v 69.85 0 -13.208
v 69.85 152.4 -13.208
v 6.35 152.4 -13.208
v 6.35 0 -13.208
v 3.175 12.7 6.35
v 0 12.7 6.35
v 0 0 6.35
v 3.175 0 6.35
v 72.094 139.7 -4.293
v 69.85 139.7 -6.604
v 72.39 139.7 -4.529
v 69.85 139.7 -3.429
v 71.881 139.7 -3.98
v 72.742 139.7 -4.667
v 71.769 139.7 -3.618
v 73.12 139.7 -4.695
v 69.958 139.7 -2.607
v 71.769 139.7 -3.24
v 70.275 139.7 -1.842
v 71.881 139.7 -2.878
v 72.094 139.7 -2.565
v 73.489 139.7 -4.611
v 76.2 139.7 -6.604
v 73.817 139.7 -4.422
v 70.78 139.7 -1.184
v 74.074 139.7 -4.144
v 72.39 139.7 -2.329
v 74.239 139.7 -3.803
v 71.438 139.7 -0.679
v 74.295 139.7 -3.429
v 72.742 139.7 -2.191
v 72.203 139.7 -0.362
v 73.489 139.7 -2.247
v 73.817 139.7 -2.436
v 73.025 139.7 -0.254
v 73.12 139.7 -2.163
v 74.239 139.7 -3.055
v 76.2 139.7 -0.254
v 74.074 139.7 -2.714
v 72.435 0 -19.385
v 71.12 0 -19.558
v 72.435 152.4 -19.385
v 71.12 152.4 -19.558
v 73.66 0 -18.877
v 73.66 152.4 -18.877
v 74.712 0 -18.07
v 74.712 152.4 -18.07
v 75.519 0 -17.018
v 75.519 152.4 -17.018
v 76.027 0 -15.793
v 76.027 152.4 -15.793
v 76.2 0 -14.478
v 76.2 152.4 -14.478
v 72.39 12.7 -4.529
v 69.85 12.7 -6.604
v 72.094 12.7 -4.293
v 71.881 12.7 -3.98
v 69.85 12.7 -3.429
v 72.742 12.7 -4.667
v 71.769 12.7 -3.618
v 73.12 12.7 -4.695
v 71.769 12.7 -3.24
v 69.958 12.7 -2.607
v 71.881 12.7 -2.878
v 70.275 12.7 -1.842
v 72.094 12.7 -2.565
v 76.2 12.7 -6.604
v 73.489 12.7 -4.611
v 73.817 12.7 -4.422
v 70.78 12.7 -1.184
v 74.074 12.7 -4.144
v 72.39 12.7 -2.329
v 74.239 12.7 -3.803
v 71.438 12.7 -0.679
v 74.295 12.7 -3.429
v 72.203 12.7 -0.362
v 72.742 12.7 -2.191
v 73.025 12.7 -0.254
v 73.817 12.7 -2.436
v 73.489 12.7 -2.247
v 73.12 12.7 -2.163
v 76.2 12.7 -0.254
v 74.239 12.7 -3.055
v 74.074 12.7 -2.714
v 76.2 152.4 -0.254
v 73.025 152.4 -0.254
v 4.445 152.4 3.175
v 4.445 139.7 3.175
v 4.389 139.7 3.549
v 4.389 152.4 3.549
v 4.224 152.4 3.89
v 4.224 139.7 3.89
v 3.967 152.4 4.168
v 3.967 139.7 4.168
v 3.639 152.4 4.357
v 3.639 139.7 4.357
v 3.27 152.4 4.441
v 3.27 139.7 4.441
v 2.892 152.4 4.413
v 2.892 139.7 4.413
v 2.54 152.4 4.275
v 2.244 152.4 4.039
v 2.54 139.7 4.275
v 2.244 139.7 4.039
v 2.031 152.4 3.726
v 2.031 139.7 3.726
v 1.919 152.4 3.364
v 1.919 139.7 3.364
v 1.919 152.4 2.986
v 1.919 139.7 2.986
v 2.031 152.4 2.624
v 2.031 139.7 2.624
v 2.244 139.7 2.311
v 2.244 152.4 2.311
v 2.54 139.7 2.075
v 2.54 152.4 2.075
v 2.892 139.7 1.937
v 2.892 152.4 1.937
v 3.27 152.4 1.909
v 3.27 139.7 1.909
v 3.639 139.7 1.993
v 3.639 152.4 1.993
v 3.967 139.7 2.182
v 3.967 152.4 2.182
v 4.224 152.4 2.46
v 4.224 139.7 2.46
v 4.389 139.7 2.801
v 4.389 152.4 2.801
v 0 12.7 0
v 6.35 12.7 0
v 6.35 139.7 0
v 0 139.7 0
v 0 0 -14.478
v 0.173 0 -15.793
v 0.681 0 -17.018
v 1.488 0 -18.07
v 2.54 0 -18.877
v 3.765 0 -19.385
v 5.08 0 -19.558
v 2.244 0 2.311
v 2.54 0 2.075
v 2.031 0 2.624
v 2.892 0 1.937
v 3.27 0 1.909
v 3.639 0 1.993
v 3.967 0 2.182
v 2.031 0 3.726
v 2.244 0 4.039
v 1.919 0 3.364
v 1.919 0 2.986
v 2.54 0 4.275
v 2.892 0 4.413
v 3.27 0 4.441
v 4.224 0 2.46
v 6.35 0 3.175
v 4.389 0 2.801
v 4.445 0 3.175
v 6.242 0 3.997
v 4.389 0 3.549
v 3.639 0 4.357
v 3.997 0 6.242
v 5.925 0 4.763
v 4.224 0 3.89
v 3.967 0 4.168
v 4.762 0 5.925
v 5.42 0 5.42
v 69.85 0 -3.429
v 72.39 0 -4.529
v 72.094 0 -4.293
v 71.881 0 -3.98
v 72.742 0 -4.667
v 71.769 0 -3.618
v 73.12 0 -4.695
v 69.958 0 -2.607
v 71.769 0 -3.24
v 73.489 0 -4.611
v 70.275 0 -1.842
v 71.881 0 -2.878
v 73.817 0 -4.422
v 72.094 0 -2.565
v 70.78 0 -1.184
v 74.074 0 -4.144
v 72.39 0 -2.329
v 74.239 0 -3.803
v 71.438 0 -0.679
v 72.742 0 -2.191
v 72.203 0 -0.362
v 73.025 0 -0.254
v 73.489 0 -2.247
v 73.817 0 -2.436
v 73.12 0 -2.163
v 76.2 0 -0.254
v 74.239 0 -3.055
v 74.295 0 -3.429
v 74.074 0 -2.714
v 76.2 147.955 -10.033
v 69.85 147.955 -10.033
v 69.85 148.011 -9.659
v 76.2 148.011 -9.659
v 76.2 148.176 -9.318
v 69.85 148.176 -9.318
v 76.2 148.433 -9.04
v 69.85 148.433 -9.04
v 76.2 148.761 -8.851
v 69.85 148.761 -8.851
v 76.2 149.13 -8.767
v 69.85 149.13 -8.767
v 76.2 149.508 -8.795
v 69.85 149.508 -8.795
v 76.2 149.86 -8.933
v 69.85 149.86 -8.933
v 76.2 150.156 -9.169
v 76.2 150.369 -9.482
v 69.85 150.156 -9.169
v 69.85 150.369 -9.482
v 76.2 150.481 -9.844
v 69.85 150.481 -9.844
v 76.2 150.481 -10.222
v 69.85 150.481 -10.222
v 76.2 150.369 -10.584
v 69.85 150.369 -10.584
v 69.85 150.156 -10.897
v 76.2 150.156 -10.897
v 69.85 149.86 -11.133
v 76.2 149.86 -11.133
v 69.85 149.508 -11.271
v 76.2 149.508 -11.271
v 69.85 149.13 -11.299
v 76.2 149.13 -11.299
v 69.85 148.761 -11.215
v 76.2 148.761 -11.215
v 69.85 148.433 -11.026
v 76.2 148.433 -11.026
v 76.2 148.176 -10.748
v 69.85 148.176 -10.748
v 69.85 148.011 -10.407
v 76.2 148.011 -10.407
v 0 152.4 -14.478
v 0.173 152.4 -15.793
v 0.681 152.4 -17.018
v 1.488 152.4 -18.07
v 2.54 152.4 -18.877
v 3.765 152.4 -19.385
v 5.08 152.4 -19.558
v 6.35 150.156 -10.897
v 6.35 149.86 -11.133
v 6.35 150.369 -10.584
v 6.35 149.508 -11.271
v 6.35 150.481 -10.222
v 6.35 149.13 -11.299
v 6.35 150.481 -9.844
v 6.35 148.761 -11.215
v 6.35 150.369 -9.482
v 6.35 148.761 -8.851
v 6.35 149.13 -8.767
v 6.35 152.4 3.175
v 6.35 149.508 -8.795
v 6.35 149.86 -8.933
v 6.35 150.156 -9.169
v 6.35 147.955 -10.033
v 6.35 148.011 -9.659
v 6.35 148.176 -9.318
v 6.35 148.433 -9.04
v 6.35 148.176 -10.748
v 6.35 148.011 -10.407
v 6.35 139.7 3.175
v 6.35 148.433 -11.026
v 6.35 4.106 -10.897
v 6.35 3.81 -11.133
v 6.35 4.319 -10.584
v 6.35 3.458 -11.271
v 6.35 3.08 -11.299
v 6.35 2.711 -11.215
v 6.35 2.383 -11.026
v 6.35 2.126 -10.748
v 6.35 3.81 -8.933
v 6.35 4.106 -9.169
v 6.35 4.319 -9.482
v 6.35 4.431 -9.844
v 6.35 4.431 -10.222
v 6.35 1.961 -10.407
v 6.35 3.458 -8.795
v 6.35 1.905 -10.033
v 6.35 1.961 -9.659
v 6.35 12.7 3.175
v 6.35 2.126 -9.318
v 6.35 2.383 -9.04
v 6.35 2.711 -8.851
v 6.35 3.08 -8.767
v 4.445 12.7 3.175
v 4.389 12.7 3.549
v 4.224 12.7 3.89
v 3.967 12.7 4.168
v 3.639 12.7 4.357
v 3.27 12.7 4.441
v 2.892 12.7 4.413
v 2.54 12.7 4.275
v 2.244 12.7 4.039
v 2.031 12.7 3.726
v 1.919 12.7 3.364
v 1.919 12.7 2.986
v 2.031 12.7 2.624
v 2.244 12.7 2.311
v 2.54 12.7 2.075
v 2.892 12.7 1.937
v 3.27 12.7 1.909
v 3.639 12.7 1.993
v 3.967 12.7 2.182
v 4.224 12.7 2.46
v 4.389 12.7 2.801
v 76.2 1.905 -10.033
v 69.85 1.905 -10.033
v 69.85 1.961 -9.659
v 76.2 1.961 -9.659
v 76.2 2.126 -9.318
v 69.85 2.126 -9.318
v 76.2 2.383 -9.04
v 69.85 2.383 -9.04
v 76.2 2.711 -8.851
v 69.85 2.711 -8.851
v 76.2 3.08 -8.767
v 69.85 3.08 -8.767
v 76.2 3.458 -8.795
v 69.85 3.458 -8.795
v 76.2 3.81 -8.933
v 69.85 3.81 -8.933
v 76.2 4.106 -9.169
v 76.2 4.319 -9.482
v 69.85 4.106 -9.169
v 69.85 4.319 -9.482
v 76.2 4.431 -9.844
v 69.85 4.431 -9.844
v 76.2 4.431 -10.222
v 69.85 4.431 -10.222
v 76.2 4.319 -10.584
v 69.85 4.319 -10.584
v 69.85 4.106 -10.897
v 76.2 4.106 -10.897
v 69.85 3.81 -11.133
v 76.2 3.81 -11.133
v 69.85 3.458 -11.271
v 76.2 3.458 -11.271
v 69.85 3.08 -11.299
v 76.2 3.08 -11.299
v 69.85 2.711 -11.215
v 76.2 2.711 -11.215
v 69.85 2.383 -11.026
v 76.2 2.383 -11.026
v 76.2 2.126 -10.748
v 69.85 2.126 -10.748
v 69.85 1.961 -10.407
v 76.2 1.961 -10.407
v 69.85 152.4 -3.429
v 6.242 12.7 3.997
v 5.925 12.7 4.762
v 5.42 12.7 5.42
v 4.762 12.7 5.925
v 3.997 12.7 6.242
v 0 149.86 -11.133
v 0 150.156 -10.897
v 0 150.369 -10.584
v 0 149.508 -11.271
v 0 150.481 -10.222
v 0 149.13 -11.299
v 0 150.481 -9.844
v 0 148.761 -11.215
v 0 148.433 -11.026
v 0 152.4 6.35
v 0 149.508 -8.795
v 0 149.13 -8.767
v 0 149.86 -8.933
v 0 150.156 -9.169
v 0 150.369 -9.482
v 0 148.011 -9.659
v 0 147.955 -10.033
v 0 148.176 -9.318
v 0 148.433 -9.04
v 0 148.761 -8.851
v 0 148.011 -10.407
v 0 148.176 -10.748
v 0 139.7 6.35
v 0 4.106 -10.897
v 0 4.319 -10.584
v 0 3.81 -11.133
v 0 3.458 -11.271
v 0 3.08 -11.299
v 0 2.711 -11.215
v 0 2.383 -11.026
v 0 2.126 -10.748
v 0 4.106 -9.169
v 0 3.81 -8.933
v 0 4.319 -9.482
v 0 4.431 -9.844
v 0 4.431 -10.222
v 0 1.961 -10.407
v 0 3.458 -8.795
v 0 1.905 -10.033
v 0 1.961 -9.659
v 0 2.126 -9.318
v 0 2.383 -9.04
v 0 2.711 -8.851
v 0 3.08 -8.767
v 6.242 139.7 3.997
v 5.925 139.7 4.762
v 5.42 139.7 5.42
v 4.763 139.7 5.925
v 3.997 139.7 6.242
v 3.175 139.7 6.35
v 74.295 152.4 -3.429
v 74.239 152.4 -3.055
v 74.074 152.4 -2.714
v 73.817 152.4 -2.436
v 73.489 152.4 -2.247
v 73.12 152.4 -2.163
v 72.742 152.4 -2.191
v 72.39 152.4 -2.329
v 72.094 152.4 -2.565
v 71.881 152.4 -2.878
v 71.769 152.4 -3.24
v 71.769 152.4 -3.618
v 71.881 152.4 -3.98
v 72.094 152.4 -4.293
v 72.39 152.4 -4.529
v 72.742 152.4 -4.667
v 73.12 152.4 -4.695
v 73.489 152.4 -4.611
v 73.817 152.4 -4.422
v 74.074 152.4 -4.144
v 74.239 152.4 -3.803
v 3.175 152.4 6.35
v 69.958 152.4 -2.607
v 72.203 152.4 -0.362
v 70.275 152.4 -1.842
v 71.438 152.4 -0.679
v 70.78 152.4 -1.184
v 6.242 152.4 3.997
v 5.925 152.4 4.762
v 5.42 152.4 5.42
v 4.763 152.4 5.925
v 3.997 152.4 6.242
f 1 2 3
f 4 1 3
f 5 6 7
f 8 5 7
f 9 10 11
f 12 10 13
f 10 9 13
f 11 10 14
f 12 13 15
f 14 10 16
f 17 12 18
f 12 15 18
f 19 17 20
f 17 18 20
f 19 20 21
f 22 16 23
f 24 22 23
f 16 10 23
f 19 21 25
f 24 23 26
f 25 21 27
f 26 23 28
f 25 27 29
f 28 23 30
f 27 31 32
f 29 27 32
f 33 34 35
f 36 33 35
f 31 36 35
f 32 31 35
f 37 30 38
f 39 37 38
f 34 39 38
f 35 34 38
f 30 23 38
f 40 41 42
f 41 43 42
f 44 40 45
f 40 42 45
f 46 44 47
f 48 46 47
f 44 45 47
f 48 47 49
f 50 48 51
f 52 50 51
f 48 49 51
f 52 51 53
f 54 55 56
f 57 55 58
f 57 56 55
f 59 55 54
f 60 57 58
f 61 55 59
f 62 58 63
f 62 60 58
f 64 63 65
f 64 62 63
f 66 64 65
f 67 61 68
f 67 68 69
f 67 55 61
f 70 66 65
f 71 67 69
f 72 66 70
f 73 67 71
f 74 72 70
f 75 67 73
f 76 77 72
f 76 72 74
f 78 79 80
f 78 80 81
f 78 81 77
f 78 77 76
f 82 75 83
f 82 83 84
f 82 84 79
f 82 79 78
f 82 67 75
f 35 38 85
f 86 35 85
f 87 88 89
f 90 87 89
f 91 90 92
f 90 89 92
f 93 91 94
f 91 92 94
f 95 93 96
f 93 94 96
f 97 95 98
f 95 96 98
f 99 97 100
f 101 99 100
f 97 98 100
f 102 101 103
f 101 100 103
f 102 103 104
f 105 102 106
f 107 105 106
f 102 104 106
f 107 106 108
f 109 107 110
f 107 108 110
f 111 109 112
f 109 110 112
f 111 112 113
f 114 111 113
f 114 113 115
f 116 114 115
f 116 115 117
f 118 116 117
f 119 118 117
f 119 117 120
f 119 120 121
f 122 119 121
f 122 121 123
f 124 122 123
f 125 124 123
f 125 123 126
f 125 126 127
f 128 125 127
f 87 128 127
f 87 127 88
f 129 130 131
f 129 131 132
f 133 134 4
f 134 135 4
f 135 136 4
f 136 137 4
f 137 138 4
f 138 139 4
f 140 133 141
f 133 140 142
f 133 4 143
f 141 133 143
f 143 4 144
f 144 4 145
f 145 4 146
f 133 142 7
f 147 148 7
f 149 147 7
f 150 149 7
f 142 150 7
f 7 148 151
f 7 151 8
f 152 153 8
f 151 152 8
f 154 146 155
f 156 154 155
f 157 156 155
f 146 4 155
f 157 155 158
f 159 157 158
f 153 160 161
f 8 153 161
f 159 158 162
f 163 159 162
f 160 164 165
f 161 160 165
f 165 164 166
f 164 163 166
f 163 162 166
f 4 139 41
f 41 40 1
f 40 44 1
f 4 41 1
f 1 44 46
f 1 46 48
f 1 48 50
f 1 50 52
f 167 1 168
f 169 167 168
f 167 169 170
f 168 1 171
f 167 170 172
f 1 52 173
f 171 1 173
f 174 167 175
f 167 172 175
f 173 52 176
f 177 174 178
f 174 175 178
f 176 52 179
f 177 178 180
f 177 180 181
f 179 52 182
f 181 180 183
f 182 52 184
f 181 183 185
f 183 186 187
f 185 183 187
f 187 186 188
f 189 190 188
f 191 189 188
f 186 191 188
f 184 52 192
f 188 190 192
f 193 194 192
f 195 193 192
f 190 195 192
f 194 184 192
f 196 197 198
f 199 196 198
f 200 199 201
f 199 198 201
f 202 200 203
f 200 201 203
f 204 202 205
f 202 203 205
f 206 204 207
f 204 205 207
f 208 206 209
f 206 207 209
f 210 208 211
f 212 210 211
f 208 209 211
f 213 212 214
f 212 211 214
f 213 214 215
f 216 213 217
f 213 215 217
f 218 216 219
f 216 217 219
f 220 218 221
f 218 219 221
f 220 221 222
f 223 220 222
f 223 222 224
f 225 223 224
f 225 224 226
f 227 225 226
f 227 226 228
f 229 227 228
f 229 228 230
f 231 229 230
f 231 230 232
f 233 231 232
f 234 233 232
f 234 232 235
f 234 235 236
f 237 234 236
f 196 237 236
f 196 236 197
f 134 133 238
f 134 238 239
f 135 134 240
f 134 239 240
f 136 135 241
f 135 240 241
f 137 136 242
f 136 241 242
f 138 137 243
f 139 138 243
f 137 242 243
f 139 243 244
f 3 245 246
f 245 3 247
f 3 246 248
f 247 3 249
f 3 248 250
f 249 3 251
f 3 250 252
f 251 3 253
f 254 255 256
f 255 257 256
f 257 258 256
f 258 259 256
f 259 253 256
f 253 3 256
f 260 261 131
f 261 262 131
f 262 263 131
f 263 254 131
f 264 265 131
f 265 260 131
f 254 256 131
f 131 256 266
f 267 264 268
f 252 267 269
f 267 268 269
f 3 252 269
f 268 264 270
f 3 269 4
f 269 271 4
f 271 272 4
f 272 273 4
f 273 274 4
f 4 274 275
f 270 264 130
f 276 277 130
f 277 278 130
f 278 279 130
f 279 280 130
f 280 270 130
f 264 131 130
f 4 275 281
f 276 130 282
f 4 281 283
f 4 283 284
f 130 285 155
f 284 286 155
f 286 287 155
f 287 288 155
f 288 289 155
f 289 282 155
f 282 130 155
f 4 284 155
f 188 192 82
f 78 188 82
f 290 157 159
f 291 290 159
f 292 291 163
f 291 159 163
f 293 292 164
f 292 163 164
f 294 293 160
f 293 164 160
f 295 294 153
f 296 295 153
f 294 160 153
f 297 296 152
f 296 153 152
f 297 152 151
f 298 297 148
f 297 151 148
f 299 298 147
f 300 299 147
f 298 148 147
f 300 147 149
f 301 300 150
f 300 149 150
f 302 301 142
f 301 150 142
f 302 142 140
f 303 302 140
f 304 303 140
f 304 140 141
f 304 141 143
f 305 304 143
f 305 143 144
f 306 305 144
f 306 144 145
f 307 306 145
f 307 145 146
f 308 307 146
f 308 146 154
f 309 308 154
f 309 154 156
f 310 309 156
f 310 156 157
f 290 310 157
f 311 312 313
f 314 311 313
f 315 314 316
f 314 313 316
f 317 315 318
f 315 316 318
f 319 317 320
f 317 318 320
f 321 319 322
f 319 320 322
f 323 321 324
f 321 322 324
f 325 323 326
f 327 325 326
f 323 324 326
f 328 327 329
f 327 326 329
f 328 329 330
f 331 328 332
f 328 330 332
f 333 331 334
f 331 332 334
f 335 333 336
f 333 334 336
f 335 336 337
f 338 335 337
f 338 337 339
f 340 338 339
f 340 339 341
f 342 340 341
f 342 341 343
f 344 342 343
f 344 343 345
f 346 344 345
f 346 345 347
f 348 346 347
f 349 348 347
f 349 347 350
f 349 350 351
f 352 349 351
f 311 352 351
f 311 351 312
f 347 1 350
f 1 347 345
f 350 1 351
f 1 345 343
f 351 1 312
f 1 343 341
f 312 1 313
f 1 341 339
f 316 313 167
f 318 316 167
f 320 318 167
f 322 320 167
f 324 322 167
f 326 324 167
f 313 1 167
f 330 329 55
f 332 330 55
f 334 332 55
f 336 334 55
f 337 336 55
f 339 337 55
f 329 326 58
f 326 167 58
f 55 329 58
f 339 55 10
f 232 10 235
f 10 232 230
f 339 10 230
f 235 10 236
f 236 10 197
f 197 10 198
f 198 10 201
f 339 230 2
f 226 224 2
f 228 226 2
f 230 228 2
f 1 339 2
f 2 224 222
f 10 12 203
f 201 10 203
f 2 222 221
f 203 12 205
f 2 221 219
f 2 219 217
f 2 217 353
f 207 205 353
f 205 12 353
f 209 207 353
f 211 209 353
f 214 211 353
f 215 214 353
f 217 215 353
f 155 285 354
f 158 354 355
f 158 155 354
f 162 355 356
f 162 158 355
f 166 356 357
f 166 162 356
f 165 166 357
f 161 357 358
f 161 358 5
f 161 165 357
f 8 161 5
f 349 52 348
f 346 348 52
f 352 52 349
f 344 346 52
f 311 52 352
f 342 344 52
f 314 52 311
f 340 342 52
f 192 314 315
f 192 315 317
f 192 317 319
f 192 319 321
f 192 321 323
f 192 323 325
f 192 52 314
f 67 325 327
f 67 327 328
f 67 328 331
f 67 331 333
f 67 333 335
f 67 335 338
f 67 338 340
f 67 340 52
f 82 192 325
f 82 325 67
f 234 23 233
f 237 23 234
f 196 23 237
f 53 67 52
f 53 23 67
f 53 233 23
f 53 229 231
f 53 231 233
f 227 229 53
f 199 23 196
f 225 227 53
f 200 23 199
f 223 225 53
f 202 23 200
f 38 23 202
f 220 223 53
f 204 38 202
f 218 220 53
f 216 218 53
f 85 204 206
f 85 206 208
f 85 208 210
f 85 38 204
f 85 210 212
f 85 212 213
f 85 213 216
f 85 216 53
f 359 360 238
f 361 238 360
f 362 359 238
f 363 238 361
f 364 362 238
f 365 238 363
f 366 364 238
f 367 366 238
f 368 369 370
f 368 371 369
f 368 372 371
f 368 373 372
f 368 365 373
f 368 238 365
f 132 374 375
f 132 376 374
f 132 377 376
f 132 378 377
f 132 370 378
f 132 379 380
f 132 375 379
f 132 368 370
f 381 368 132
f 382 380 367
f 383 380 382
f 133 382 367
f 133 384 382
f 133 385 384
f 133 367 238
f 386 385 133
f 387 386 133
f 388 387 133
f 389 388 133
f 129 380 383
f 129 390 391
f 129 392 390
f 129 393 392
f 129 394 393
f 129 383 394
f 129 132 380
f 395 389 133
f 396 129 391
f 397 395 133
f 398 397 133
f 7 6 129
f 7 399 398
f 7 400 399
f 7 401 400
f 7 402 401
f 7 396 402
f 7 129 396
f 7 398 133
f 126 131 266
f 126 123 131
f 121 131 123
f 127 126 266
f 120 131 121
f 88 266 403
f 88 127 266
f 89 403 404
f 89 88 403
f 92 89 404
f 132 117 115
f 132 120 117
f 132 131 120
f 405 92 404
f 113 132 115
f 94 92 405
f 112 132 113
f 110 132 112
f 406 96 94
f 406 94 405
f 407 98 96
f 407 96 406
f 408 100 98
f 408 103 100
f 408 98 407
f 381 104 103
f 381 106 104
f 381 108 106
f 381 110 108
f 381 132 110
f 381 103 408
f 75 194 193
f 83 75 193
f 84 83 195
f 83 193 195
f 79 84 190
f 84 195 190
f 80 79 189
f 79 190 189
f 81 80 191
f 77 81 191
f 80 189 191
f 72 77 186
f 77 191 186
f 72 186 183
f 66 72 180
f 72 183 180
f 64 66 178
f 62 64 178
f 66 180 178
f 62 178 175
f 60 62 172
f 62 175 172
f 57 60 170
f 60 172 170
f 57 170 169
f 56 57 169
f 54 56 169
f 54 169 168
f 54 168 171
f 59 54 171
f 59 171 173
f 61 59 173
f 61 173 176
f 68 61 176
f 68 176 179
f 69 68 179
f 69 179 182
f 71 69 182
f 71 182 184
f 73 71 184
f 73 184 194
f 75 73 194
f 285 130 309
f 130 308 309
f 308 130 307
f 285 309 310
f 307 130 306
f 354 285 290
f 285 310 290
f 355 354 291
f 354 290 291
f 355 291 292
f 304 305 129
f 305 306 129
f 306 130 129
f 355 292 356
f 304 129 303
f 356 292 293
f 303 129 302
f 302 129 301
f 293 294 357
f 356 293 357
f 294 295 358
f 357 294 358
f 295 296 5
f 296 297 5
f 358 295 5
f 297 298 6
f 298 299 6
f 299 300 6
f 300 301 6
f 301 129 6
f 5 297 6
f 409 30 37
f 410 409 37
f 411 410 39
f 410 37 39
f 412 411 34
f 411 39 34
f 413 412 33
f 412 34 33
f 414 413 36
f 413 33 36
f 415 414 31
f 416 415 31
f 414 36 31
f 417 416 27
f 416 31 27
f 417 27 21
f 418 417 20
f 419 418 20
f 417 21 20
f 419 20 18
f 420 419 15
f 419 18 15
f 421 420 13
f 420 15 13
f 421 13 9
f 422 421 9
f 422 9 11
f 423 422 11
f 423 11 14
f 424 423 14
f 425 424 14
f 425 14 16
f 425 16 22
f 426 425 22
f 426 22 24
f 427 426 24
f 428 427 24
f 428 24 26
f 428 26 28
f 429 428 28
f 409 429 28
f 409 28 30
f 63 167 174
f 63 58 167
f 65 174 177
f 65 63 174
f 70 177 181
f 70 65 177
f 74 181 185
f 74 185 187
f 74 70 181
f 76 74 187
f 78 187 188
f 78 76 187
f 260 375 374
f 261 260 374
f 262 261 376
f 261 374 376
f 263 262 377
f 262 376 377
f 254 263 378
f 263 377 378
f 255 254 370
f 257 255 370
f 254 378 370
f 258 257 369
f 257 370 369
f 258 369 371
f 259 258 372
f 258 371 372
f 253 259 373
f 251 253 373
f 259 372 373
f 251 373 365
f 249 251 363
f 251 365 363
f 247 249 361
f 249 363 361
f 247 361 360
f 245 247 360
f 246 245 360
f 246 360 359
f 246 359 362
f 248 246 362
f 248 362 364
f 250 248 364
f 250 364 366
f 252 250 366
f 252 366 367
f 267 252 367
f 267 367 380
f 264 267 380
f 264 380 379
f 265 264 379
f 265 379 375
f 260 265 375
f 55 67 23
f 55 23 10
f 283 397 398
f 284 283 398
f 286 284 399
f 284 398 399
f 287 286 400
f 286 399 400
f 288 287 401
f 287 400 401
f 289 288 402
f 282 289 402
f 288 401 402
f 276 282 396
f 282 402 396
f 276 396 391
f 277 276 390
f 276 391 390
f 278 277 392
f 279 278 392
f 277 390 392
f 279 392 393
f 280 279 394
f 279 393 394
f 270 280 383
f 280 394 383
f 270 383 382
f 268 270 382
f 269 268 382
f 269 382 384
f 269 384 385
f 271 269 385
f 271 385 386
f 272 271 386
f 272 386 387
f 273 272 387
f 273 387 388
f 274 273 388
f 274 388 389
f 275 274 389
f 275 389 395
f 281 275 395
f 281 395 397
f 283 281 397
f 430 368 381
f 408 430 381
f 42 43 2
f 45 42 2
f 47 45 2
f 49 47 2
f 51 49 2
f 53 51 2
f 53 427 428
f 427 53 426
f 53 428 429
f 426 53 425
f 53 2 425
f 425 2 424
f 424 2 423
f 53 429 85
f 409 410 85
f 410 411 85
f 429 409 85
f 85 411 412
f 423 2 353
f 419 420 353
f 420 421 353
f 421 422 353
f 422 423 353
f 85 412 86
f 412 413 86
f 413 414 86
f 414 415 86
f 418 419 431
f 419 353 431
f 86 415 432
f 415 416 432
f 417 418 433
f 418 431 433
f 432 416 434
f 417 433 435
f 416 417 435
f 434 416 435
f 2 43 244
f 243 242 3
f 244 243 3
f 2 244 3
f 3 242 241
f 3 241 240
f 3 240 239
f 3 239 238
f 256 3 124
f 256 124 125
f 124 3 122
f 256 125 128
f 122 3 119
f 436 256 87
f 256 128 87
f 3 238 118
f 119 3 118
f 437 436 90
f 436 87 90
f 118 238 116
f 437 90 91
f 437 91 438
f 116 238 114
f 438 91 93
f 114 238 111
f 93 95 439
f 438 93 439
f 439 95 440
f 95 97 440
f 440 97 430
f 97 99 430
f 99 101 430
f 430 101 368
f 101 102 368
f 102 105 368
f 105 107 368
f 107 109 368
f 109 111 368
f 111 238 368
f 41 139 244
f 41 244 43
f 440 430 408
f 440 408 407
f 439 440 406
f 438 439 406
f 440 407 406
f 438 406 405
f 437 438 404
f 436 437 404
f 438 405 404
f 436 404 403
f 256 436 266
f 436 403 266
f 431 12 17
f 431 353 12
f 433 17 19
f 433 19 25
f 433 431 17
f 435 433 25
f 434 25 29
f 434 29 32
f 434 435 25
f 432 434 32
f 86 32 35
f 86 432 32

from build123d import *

# Parameters (mm, degrees)
F1_DEPTH  = 152.4
F2_R      = 5.08
F4_R      = 1.27
F5_DEPTH  = 76.201
F6_W      = 12.7
F6_H      = 6.35
F7_DEPTH  = 6.35
F8_W      = 12.7
F8_H      = 6.35
F9_DEPTH  = 6.35
F10_R     = 1.27
F11_DEPTH = 152.401
F12_R     = 3.175


with BuildPart() as f1:
    # F0 (on Front) → F1 (new body)
    with BuildSketch(Plane.XZ):
        Polygon((0, 0), (0, -19.558), (76.2, -19.558), (76.2, -6.604), (69.85, -6.604), (69.85, -13.208), (6.35, -13.208), (6.35, 0), align=None)
    extrude(amount=-F1_DEPTH)

    # F2
    f2_edges = [f1.edges().sort_by_distance(p)[0] for p in [
        (0, 76.2, -19.558),
        (76.2, 76.2, -19.558),
    ]]
    fillet(f2_edges, radius=F2_R)

    # F4 (on face) → F5 (cut, through all)
    with BuildSketch(Plane(origin=(0, 0, 0), x_dir=(0, -1, 0), z_dir=(-1, 0, 0))):
        with Locations((-149.225, -10.033)):
            Circle(F4_R)
        with Locations((-3.175, -10.033)):
            Circle(F4_R)
    extrude(amount=-F5_DEPTH, mode=Mode.SUBTRACT)

    # F6 (on face) → F7 (join)
    with BuildSketch(Plane.YZ.offset(76.2)):
        with Locations((6.35, -3.429)):
            Rectangle(F6_W, F6_H)
        with Locations((146.05, -3.429)):
            Rectangle(F6_W, F6_H)
    extrude(amount=-F7_DEPTH)

    # F8 (on face) → F9 (join)
    with BuildSketch(Plane(origin=(0, 0, 0), x_dir=(0, -1, 0), z_dir=(-1, 0, 0))):
        with Locations((-146.05, 3.175)):
            Rectangle(F8_W, F8_H)
        with Locations((-6.35, 3.175)):
            Rectangle(F8_W, F8_H)
    extrude(amount=-F9_DEPTH)

    # F10 (on face) → F11 (cut, through all)
    with BuildSketch(Plane.XZ):
        with Locations((73.025, -3.429)):
            Circle(F10_R)
        with Locations((3.175, 3.175)):
            Circle(F10_R)
    extrude(amount=-F11_DEPTH, mode=Mode.SUBTRACT)

    # F12
    f12_edges = [f1.edges().sort_by_distance(p)[0] for p in [
        (69.85, 6.35, -0.254),
        (69.85, 146.05, -0.254),
        (6.35, 6.35, 6.35),
        (6.35, 146.05, 6.35),
    ]]
    fillet(f12_edges, radius=F12_R)


solid = f1.part
